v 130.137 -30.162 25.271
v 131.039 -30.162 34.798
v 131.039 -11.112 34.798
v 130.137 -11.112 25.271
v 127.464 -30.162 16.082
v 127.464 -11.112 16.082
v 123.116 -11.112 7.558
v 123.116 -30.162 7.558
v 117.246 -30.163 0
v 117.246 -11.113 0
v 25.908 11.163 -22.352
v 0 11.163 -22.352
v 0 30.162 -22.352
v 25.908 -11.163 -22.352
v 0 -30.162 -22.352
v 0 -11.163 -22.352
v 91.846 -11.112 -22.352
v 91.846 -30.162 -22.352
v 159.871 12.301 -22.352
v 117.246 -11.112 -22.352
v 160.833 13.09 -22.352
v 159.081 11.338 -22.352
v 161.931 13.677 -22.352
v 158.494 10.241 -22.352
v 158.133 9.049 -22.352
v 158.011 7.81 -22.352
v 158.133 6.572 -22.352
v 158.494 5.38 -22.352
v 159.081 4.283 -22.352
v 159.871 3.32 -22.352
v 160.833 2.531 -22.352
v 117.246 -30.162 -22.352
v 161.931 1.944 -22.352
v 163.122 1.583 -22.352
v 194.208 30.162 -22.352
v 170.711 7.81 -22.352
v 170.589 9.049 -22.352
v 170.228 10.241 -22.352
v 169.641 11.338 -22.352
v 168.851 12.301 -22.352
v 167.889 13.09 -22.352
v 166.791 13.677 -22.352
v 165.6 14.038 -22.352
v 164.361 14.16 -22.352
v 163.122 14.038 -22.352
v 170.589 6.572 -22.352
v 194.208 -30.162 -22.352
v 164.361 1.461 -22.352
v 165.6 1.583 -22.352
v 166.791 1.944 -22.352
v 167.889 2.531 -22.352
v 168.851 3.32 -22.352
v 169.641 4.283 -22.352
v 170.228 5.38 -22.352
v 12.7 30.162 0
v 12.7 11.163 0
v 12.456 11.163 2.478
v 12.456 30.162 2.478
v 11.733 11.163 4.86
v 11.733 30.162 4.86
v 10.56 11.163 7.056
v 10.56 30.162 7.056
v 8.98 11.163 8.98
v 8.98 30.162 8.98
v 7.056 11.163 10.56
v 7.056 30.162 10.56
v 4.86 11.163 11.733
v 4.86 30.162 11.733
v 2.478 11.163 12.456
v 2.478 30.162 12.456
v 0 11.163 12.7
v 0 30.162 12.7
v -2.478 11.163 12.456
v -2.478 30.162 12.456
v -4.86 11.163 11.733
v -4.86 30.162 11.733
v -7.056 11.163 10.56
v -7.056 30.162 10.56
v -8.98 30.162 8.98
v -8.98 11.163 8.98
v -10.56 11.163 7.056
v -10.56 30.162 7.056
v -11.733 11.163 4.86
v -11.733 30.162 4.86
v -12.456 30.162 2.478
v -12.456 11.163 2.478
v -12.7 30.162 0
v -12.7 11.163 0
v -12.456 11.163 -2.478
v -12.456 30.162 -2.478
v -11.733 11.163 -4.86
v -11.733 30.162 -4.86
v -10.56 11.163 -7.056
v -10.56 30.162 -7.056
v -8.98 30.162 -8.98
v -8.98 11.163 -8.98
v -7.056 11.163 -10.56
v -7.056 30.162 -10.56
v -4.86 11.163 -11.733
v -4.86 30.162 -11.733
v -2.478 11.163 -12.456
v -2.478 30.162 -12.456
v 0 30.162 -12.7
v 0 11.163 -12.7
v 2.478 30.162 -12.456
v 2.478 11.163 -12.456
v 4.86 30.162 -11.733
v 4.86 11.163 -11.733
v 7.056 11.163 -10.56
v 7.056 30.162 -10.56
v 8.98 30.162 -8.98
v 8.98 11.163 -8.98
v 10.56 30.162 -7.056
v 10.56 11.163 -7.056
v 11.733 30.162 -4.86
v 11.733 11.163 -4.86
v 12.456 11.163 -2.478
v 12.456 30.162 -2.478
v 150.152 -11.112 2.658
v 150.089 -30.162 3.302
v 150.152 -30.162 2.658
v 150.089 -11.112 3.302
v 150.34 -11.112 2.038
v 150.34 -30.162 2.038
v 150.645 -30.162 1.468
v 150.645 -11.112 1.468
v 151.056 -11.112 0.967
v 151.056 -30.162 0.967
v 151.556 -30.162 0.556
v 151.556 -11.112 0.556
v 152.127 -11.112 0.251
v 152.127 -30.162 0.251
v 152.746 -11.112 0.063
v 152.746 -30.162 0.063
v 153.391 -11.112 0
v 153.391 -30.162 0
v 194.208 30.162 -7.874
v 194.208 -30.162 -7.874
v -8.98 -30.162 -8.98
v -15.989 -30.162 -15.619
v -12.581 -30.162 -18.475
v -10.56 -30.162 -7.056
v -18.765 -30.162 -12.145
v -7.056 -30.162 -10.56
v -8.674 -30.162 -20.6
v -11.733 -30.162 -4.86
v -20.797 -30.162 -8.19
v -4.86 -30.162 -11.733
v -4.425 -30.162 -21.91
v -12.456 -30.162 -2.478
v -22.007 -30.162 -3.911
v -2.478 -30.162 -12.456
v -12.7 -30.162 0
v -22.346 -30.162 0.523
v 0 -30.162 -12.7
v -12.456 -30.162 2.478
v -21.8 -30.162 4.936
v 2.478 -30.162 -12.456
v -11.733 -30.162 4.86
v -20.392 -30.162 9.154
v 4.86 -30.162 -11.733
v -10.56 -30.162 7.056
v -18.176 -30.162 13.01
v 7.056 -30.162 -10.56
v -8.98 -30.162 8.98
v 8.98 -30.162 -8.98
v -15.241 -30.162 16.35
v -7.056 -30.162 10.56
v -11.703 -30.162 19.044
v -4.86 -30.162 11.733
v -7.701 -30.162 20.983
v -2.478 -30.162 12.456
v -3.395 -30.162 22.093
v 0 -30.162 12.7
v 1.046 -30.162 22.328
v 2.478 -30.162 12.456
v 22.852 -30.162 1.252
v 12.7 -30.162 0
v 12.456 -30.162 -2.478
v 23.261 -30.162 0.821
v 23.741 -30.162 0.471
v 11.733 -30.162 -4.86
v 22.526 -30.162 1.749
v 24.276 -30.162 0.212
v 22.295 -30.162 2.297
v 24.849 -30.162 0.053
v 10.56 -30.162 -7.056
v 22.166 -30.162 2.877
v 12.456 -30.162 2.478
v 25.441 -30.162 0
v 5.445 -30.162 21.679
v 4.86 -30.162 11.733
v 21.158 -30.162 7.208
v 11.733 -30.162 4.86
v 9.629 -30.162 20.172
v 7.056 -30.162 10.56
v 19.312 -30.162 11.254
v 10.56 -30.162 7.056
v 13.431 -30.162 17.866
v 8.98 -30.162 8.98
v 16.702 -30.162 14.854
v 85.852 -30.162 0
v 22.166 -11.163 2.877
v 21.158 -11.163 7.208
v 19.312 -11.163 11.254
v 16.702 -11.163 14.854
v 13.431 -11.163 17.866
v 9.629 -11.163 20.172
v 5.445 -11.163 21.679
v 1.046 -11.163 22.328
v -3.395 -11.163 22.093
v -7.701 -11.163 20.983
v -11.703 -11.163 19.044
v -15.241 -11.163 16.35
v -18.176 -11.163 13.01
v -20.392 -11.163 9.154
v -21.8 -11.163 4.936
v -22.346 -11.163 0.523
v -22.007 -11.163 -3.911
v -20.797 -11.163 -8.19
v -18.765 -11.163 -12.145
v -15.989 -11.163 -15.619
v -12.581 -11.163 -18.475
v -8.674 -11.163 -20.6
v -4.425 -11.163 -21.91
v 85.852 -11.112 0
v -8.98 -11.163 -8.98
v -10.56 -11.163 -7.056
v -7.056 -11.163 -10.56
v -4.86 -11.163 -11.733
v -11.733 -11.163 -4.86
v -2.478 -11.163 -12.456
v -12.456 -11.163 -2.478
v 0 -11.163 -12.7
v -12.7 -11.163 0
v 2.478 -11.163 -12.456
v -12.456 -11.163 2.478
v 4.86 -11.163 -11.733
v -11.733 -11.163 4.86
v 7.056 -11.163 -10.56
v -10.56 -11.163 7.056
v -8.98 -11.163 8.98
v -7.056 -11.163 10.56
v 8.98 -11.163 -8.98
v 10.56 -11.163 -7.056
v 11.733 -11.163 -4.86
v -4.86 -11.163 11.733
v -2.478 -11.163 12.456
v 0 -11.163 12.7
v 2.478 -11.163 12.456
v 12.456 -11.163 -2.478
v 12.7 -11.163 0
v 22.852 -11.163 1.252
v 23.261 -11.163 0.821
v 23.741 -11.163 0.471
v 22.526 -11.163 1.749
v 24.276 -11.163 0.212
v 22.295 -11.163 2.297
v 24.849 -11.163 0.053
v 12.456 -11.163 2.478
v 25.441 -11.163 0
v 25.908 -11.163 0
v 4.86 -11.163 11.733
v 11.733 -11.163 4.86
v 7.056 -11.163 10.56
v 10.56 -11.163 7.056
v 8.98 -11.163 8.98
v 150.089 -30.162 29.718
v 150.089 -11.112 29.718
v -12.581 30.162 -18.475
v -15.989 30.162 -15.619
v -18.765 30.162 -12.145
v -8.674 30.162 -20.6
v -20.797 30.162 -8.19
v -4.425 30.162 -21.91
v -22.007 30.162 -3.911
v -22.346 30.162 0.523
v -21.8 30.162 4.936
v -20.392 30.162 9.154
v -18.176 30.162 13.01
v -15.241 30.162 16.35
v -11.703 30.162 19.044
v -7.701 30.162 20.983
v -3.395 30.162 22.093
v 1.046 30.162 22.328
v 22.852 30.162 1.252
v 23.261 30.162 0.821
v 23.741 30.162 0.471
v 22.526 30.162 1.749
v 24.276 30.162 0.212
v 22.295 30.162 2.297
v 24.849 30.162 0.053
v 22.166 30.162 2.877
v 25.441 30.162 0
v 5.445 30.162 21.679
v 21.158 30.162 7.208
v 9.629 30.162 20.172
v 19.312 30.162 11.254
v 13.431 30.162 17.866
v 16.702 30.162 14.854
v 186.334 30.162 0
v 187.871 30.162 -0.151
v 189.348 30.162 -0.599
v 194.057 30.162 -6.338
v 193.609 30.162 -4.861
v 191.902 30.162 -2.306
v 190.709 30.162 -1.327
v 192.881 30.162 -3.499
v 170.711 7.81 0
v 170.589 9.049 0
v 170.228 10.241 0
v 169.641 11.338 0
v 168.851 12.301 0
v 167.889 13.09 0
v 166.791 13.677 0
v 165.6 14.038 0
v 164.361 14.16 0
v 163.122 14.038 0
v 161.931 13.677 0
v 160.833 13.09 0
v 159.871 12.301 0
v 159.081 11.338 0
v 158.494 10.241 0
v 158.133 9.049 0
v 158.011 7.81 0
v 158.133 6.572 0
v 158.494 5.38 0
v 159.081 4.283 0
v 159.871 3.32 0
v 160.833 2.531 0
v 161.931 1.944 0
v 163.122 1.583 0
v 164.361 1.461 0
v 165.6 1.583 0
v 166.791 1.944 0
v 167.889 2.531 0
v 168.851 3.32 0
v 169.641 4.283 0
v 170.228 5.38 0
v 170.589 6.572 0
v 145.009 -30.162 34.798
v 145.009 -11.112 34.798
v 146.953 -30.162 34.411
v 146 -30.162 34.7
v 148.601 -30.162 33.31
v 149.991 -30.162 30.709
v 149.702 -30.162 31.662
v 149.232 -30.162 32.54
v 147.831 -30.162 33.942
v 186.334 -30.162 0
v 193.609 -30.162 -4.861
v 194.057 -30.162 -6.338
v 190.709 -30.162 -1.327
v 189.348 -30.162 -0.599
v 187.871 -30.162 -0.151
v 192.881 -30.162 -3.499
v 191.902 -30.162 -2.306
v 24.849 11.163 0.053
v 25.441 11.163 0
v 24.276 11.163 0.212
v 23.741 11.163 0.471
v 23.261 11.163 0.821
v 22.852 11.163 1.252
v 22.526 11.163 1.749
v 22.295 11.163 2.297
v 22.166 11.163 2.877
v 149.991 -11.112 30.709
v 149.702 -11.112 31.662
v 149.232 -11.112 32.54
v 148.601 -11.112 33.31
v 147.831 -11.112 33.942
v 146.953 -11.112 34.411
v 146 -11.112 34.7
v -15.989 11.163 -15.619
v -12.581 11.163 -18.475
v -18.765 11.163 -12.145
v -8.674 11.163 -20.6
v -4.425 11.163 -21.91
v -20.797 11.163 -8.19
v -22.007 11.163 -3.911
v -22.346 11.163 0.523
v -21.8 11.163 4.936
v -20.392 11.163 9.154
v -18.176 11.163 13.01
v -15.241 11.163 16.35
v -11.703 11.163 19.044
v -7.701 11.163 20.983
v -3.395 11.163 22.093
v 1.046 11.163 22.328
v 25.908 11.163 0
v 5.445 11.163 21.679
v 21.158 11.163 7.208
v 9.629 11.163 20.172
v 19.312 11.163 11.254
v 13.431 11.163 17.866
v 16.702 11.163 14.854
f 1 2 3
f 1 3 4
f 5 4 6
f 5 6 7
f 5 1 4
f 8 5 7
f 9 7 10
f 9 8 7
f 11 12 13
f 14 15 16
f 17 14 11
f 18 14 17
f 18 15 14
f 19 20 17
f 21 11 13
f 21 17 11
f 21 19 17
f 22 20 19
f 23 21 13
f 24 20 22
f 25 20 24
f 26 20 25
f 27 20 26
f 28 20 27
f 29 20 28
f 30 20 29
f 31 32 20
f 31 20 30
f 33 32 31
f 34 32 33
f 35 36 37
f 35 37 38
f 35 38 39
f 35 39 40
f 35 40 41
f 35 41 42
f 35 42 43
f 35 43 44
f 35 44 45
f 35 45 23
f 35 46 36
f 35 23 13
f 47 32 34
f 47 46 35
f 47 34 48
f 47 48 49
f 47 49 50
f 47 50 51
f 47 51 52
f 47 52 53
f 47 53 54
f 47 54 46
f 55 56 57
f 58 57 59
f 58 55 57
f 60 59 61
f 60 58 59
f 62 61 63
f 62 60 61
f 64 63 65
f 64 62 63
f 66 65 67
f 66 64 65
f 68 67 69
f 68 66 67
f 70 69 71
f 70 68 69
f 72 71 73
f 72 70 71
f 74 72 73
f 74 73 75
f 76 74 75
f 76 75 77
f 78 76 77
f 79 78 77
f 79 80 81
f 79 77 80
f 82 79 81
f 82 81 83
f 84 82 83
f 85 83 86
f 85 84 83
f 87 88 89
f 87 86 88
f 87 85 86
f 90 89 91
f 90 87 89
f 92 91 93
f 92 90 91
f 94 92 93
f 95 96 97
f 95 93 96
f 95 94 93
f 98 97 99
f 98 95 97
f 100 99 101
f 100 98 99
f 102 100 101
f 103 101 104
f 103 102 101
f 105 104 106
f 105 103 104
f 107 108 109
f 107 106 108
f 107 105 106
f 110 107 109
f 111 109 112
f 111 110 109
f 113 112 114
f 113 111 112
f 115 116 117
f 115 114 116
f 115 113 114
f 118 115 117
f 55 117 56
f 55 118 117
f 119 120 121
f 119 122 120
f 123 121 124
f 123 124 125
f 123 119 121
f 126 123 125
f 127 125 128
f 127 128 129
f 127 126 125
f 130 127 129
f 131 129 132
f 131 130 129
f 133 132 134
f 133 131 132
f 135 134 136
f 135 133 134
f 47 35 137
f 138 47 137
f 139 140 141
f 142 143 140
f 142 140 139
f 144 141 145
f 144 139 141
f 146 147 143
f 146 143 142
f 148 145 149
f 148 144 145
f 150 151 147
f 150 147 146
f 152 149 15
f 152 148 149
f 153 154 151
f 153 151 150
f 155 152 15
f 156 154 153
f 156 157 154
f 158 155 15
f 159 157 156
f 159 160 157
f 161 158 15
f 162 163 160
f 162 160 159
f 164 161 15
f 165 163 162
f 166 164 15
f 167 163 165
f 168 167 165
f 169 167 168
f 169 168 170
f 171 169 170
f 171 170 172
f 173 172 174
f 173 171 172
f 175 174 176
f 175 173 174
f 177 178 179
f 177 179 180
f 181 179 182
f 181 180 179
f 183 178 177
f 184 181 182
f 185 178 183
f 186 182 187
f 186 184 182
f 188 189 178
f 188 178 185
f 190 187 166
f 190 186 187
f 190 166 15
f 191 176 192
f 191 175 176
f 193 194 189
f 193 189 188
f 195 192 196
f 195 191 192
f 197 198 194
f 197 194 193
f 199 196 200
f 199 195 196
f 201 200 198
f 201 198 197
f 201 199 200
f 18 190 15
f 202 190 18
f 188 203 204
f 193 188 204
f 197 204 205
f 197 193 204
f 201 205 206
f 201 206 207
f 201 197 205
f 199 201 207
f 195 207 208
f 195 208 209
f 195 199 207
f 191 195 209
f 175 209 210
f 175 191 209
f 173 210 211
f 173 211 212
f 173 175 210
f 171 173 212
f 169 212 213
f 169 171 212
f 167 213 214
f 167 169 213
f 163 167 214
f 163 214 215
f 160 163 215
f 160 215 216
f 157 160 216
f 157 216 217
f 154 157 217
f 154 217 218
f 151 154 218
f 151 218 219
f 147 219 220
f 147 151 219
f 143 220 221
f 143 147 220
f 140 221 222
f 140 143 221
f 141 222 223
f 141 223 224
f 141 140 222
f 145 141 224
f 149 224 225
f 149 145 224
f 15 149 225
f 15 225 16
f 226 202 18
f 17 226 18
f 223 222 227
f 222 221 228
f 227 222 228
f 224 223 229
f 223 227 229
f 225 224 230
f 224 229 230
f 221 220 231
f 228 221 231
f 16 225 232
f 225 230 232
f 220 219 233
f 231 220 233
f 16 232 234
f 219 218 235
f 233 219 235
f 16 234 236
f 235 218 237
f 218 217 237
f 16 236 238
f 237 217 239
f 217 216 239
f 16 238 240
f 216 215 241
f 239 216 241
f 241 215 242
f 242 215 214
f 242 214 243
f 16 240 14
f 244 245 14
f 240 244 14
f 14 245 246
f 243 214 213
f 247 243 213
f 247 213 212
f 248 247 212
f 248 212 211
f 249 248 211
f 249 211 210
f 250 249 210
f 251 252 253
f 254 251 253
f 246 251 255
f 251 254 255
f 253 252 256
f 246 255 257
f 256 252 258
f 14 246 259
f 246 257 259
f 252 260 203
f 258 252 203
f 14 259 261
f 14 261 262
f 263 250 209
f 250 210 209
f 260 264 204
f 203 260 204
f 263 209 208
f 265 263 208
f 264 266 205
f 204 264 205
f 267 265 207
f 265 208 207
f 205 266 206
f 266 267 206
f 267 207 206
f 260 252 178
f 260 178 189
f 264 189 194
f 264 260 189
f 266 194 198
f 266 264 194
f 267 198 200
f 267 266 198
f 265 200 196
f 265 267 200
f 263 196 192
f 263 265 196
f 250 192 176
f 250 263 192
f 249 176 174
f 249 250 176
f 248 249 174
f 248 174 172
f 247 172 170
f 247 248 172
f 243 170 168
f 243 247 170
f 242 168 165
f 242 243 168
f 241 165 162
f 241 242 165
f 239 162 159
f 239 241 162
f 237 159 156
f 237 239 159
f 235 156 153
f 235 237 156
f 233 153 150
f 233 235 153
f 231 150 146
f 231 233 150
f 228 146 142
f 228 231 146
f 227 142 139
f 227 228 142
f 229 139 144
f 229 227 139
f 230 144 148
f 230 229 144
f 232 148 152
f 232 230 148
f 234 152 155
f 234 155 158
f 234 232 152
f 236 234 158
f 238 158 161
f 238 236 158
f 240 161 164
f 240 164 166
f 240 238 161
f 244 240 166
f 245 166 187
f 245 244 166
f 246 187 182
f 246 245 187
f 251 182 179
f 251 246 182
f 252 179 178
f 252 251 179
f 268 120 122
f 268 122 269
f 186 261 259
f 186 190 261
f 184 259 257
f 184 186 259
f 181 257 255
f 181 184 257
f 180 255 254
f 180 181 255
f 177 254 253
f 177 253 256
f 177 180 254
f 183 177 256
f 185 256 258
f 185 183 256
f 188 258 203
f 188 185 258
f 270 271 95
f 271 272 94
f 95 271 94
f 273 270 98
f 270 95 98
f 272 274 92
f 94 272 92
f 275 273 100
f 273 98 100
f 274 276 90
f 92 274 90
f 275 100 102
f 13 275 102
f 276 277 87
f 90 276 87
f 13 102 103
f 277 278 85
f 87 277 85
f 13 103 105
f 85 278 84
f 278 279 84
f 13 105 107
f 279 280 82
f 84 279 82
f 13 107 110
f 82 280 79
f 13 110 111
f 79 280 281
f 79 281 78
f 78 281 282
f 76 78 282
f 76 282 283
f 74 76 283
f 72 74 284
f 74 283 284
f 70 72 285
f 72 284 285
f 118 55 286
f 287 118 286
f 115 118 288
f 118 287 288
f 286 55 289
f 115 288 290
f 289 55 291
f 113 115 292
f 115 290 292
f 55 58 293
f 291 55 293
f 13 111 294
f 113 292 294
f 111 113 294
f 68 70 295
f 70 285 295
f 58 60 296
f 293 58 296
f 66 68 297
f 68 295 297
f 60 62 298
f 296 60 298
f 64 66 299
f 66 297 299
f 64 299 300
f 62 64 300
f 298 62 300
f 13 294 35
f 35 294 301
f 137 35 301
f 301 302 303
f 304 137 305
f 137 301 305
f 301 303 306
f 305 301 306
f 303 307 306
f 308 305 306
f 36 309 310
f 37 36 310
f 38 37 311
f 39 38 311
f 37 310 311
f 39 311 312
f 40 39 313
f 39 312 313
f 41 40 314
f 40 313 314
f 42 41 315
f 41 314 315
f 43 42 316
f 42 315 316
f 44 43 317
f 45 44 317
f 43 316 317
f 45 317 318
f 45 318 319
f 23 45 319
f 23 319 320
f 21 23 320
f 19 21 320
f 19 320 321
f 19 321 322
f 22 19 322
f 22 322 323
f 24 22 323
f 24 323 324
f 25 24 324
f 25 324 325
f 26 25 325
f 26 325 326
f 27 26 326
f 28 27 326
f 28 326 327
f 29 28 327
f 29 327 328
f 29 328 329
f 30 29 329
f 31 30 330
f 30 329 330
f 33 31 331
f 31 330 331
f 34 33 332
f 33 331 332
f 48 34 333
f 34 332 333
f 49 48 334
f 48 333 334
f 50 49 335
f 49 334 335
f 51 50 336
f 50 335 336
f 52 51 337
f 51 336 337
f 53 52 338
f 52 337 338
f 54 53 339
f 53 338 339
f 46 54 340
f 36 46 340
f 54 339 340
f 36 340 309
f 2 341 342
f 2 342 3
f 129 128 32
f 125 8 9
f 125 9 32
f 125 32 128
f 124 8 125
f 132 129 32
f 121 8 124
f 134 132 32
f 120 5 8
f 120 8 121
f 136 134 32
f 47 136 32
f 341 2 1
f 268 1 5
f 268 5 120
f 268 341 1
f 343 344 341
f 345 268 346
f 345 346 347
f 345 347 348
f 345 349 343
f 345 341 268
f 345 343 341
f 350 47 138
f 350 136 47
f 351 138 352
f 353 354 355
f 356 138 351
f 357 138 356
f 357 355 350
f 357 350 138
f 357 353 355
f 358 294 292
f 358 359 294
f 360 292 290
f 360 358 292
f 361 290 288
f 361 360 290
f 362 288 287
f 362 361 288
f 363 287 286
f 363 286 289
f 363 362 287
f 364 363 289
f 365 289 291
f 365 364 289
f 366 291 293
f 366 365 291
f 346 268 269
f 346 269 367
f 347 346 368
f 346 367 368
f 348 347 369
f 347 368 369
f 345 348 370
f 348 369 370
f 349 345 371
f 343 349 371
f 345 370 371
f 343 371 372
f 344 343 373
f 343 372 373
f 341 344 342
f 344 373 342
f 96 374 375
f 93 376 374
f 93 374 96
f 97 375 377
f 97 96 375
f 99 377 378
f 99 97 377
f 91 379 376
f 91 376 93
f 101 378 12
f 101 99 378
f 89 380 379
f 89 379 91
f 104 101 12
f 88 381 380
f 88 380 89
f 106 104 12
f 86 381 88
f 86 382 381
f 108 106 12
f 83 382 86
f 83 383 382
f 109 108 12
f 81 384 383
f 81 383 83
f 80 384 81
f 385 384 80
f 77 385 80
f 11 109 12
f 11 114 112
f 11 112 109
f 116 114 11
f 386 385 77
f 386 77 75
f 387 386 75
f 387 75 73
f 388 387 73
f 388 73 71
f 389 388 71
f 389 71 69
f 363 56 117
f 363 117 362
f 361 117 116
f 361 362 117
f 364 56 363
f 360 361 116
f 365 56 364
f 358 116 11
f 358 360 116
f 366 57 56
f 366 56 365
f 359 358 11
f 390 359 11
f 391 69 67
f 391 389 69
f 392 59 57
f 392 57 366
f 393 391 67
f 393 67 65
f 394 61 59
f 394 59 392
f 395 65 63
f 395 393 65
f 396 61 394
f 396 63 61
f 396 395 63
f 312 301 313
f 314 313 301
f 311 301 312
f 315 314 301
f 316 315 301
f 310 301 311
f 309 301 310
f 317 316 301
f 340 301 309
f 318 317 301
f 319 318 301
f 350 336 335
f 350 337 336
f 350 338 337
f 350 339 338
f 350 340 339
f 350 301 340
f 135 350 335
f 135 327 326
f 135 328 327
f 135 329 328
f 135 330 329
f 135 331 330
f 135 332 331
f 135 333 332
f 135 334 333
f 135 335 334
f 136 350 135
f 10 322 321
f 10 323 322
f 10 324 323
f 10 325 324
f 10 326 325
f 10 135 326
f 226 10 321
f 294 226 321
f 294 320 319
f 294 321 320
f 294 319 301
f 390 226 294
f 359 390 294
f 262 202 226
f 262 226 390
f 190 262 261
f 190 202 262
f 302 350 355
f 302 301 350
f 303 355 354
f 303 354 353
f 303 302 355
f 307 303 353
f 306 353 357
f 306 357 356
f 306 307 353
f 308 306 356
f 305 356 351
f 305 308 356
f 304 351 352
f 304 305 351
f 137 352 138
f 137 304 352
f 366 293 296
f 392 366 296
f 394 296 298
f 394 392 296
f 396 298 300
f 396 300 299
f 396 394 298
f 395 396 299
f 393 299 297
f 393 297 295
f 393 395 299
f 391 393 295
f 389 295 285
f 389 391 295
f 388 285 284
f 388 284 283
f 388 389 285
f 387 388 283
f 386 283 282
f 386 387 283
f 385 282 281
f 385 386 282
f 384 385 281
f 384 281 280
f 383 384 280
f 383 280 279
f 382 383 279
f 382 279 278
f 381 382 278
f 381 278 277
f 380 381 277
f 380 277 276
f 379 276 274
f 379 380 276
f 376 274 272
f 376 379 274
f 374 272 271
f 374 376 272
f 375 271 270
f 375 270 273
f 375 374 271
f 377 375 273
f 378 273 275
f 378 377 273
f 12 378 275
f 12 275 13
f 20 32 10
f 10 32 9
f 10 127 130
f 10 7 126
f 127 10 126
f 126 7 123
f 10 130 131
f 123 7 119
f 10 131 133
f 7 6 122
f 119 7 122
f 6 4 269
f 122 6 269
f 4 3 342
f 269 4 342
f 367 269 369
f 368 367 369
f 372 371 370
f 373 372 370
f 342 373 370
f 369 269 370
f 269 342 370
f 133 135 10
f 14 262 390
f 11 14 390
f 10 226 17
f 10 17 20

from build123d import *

# Parameters (mm, degrees)
F0_R     = 12.7
F1_DEPTH = 30.1625
F2_W     = 48.26
F2_H     = 22.3266
F3_DEPTH = 22.352
F5_DEPTH = 19.05
F7_DEPTH = 19.05
F8_R     = 6.35
F9_DEPTH = 22.353
F10_R    = 3.302
F11_R    = 7.874
F12_R    = 5.08


with BuildPart() as f1:
    # F0 (on Front) → F1 (new body, symmetric)
    with BuildSketch(Plane.XZ):
        with BuildLine():
            Line((194.2084, 0), (22.352, 0))
            ThreePointArc((22.352, 0), (15.8052507731, -15.8052507731), (0, -22.352))
            Line((0, -22.352), (194.2084, -22.352))
            Line((194.2084, -22.352), (194.2084, 0))
        make_face()
        with BuildLine():
            ThreePointArc((0, -22.352), (15.8052507731, -15.8052507731), (22.352, 0))
            ThreePointArc((22.352, 0), (-15.8052507731, 15.8052507731), (0, -22.352))
        make_face()
        Circle(F0_R, mode=Mode.SUBTRACT)
    extrude(amount=F1_DEPTH, both=True)

    # F2 (on Top) → F3 (cut, symmetric)
    with BuildSketch(Plane.XY):
        with Locations((1.778, 0)):
            Rectangle(F2_W, F2_H)
    extrude(amount=F3_DEPTH, both=True, mode=Mode.SUBTRACT)

    # F4 (on face) → F5 (cut)
    with BuildSketch(Plane.XZ.offset(30.1625)):
        Polygon((85.852, 0), (91.8464, -22.352), (117.2464, -22.352), (117.2464, 0), align=None)
    extrude(amount=-F5_DEPTH, mode=Mode.SUBTRACT)

    # F6 (on face) → F7 (join, through all)
    with BuildSketch(Plane.XZ.offset(30.1625)):
        with BuildLine():
            Line((117.2464, 0), (150.0886, 0))
            Line((150.0886, 0), (150.0886, 34.798))
            Line((150.0886, 34.798), (131.0386, 34.798))
            ThreePointArc((131.0386, 34.798), (127.4644153616, 16.0823576341), (117.2464, 0))
        make_face()
    extrude(amount=-F7_DEPTH)

    # F8 (on face) → F9 (cut, through all)
    with BuildSketch(Plane.XY):
        with Locations((164.3608808517, 7.8105)):
            Circle(F8_R)
    extrude(amount=-F9_DEPTH, mode=Mode.SUBTRACT)

    # F10
    f10_edges = [f1.edges().sort_by_distance(p)[0] for p in [
        (22.352, -20.6629, 0),
        (150.0886, -20.6375, 0),
        (22.352, 20.6629, 0),
    ]]
    fillet(f10_edges, radius=F10_R)

    # F11
    f11_edges = [f1.edges().sort_by_distance(p)[0] for p in [
        (194.2084, 0, 0),
    ]]
    fillet(f11_edges, radius=F11_R)

    # F12
    f12_edges = [f1.edges().sort_by_distance(p)[0] for p in [
        (150.0886, -20.6375, 34.798),
    ]]
    fillet(f12_edges, radius=F12_R)


solid = f1.part
